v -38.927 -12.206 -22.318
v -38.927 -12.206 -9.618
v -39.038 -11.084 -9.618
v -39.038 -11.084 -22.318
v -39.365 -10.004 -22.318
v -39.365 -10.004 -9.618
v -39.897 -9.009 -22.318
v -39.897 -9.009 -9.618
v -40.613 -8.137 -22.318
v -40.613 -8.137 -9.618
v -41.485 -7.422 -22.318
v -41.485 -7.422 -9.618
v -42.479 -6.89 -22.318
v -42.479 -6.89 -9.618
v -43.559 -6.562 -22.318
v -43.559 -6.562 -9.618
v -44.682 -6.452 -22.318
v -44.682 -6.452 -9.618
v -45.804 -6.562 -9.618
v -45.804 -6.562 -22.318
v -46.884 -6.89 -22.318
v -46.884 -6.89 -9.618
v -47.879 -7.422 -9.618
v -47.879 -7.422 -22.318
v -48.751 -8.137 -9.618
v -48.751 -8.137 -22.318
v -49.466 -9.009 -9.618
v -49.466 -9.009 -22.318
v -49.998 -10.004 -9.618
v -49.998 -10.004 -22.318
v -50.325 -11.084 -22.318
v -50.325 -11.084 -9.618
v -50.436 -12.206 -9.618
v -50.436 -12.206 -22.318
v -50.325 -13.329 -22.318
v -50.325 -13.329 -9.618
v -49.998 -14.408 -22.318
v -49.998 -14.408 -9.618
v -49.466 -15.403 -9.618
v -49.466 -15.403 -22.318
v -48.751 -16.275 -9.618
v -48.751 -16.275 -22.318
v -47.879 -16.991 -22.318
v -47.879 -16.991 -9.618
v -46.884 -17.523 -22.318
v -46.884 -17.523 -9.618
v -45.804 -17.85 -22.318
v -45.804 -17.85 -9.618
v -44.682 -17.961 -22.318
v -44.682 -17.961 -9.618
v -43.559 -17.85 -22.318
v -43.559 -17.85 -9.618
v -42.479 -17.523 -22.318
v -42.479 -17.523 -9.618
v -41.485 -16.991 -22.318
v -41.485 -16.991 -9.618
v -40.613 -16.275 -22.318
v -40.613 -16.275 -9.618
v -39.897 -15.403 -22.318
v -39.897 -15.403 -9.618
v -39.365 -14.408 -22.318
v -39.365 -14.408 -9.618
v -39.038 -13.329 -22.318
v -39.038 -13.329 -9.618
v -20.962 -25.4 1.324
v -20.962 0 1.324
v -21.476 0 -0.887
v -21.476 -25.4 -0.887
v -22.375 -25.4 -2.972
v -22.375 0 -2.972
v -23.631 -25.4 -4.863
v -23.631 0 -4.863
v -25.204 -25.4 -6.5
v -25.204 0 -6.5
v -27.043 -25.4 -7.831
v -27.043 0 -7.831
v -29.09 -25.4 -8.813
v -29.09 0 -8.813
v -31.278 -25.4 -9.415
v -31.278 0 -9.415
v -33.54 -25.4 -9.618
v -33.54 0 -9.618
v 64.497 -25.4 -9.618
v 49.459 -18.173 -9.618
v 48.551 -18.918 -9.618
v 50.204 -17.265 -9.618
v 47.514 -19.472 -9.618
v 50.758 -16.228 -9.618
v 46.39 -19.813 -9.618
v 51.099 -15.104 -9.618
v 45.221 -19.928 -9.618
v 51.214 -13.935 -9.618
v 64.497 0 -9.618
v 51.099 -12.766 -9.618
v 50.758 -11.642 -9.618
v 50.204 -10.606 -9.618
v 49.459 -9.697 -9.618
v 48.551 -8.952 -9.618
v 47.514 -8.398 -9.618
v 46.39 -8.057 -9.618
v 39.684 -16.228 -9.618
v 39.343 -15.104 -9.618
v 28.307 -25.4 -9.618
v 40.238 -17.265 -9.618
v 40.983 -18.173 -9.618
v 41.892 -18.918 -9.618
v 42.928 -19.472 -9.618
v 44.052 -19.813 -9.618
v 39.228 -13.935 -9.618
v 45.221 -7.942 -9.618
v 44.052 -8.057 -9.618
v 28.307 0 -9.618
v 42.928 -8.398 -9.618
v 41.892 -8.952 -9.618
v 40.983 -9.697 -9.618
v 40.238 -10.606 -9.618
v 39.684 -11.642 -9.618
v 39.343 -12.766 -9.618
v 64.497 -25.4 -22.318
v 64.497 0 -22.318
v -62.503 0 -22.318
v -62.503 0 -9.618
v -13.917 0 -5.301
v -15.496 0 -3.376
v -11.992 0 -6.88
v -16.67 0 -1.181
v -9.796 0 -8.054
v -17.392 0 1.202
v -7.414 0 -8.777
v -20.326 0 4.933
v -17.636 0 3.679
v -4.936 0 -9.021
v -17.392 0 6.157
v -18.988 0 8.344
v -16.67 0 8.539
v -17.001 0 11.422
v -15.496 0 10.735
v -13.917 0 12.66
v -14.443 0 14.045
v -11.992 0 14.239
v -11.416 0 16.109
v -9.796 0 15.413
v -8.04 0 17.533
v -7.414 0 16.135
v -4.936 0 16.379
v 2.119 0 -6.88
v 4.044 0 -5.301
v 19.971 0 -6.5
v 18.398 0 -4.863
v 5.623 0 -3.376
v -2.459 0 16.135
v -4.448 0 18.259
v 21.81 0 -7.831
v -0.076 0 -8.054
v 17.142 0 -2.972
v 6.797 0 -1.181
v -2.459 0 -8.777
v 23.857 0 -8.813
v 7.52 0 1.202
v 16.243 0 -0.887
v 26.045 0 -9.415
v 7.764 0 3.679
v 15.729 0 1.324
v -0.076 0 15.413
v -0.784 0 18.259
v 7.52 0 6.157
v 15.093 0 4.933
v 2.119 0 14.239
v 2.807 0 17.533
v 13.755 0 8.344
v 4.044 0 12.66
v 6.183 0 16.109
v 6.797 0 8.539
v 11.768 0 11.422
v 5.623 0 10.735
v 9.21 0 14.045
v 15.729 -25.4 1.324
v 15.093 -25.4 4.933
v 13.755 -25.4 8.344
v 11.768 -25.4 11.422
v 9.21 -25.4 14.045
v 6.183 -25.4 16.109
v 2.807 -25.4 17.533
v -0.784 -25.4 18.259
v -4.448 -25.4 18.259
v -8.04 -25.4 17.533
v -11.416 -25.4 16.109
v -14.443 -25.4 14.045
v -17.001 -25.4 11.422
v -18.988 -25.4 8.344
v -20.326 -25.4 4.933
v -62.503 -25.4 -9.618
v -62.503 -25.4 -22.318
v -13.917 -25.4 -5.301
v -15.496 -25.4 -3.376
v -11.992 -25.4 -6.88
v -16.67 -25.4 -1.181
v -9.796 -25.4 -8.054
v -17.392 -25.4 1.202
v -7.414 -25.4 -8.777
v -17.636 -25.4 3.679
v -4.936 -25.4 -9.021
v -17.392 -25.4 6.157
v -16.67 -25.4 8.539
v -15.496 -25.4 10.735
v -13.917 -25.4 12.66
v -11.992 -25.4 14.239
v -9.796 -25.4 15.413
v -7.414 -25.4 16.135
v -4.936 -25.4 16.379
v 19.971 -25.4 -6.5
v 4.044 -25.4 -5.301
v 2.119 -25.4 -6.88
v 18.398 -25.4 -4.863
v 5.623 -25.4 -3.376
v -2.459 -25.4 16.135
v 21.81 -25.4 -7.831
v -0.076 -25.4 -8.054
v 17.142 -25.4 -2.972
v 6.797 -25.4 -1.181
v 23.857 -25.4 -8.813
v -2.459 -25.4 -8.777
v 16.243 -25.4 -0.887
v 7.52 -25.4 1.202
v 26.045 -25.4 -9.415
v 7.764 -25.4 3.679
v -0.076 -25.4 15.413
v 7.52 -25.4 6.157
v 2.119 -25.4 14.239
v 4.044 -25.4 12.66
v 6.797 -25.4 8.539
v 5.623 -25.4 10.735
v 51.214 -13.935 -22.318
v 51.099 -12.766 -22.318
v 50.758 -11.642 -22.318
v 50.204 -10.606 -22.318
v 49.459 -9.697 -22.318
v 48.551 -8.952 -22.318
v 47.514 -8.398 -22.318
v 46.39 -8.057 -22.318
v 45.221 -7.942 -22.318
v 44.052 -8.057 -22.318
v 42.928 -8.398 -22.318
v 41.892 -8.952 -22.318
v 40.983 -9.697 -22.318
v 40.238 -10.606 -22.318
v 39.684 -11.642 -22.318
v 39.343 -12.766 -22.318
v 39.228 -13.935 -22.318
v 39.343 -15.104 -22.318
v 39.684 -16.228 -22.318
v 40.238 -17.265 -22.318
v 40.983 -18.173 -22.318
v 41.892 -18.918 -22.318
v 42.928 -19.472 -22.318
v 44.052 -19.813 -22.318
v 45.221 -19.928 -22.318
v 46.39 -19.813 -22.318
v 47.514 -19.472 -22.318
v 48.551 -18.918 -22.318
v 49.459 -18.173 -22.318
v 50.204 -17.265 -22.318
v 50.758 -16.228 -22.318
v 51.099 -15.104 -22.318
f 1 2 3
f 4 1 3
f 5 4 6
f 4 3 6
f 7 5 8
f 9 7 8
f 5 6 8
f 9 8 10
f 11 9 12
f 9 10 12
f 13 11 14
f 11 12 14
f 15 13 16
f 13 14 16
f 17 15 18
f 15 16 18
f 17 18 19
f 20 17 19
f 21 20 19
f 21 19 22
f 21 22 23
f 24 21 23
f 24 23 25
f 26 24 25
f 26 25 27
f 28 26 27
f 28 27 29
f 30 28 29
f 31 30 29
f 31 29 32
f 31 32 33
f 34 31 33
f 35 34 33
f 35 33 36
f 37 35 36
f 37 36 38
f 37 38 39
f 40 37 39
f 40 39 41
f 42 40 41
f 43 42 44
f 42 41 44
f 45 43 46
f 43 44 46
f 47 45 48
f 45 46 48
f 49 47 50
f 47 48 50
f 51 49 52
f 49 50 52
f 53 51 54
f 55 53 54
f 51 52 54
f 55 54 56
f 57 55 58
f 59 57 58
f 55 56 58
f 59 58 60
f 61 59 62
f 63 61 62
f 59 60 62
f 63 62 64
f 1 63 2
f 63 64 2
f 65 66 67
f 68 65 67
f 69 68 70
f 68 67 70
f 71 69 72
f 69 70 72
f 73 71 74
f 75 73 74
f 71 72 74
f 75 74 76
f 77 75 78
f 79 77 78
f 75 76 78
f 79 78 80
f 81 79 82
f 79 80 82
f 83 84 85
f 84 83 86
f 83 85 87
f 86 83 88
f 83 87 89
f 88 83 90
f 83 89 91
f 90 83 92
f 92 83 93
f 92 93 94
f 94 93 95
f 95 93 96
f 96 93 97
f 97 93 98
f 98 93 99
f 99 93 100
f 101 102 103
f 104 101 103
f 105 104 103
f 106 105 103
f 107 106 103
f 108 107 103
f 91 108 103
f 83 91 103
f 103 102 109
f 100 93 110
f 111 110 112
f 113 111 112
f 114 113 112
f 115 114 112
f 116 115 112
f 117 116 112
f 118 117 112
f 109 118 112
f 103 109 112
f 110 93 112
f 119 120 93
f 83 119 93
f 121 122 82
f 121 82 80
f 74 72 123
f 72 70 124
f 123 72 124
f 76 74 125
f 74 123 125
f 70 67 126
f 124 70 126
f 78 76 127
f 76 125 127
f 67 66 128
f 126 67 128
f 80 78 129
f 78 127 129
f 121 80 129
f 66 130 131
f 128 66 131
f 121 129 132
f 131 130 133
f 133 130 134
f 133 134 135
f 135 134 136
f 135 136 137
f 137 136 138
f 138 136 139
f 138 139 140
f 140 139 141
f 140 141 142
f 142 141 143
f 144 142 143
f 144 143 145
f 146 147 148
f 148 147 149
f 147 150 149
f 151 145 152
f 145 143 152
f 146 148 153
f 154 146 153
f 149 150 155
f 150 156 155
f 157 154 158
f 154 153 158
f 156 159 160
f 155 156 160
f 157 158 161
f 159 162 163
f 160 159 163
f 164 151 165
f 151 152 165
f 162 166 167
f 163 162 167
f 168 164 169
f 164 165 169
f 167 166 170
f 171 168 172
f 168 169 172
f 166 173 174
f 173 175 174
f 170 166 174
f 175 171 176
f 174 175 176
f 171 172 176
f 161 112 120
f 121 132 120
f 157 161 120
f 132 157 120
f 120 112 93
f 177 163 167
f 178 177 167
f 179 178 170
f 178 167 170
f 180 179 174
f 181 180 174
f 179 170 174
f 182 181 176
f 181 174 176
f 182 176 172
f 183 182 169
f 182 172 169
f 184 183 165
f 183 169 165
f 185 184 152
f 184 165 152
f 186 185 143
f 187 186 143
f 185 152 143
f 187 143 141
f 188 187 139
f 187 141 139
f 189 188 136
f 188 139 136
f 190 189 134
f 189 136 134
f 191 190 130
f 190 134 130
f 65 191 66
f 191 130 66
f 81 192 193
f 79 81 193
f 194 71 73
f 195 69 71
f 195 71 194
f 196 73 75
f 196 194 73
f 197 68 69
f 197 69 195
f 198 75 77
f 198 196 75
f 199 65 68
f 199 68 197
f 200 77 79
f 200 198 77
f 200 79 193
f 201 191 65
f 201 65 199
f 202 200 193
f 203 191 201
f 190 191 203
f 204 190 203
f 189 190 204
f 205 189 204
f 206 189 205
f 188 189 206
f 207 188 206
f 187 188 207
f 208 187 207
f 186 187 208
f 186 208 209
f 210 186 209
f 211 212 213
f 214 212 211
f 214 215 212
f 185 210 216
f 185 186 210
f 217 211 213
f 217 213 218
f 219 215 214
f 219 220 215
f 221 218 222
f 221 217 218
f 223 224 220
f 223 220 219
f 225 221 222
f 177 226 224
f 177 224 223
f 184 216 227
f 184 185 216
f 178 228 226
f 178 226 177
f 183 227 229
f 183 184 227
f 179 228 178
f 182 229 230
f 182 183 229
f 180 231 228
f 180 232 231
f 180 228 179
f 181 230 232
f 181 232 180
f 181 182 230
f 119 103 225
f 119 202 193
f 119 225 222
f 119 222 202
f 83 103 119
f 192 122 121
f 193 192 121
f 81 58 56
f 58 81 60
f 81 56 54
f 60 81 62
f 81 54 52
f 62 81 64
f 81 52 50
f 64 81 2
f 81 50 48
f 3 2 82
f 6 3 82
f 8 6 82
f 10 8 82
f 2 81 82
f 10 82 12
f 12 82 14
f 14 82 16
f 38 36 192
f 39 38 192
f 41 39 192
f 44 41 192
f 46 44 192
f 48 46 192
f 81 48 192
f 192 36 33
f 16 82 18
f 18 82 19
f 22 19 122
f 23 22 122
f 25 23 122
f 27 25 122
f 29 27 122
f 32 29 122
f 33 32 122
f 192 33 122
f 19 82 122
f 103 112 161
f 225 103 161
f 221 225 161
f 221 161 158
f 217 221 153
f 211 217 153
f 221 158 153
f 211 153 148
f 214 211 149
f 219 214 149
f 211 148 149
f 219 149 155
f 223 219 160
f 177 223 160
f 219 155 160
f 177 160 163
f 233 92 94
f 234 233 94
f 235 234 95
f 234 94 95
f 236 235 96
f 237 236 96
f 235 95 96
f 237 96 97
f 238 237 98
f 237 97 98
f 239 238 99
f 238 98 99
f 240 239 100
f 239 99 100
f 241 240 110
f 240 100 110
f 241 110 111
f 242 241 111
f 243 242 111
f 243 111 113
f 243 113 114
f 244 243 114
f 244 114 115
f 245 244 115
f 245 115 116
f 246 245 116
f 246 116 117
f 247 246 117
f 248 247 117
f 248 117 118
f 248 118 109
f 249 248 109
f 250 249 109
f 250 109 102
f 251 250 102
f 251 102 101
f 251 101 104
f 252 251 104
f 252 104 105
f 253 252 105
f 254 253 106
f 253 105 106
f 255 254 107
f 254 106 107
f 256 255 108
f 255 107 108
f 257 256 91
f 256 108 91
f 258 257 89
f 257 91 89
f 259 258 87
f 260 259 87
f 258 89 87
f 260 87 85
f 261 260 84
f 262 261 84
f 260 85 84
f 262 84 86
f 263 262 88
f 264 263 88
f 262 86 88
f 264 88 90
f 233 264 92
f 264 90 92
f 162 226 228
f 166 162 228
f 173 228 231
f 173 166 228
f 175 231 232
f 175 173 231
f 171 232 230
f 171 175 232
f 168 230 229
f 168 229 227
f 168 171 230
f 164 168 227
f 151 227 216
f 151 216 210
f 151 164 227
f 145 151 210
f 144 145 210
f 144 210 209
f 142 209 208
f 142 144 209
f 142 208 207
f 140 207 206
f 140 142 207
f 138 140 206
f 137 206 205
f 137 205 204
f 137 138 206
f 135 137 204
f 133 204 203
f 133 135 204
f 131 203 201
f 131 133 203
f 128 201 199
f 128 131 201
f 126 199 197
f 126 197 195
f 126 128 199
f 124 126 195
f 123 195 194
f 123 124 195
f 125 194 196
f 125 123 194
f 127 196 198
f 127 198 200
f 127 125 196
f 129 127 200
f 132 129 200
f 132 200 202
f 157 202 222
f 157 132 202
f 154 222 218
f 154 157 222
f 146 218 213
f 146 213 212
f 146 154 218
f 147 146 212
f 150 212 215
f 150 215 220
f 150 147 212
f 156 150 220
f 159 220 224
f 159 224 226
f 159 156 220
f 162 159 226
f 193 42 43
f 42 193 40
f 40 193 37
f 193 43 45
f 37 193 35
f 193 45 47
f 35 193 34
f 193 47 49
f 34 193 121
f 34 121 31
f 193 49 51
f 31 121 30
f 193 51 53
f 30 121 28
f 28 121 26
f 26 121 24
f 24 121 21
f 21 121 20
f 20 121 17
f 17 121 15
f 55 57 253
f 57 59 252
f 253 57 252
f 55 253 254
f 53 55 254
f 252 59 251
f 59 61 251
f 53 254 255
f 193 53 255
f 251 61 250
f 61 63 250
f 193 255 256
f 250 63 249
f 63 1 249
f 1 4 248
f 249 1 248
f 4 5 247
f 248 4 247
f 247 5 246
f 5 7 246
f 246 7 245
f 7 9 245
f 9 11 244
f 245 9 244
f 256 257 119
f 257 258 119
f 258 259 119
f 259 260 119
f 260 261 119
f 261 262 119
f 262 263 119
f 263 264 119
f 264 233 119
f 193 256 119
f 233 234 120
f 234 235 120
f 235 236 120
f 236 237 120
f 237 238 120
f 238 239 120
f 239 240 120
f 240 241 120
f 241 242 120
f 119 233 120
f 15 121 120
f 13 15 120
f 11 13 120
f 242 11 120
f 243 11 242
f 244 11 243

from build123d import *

# Parameters (mm, degrees)
F0_R     = 12.7
F1_DEPTH = 25.4
F2_R     = 5.754427
F4_DEPTH = 25.4
F3_R     = 5.992973
F5_DEPTH = 25.4


with BuildPart() as f1:
    # F0 (on Front) → F1 (new body)
    with BuildSketch(Plane.XZ):
        with BuildLine():
            Line((-33.539512, -9.618156), (-62.502647, -9.618156))
            Line((-62.502647, -9.618156), (-62.502647, -22.318156))
            Line((-62.502647, -22.318156), (64.497353, -22.318156))
            Line((64.497353, -22.318156), (64.497353, -9.618156))
            Line((64.497353, -9.618156), (28.306579, -9.618156))
            ThreePointArc((28.306579, -9.618156), (19.970903, -6.499727), (15.728804, 1.324127))
            ThreePointArc((15.728804, 1.324127), (-2.616467, 18.350258), (-20.961737, 1.324127))
            ThreePointArc((-20.961737, 1.324127), (-25.203836, -6.499727), (-33.539512, -9.618156))
        make_face()
        with Locations((-4.936342, 3.67939)):
            Circle(F0_R, mode=Mode.SUBTRACT)
    extrude(amount=F1_DEPTH)

    # F2 (on face) → F4 (cut)
    with BuildSketch(Plane.XY.offset(-9.618156)):
        with Locations((-44.681605, -12.206142)):
            Circle(F2_R)
    extrude(amount=-F4_DEPTH, mode=Mode.SUBTRACT)

    # F3 (on face) → F5 (cut)
    with BuildSketch(Plane.XY.offset(-9.618156)):
        with Locations((45.22102, -13.935037)):
            Circle(F3_R)
    extrude(amount=-F5_DEPTH, mode=Mode.SUBTRACT)


solid = f1.part
